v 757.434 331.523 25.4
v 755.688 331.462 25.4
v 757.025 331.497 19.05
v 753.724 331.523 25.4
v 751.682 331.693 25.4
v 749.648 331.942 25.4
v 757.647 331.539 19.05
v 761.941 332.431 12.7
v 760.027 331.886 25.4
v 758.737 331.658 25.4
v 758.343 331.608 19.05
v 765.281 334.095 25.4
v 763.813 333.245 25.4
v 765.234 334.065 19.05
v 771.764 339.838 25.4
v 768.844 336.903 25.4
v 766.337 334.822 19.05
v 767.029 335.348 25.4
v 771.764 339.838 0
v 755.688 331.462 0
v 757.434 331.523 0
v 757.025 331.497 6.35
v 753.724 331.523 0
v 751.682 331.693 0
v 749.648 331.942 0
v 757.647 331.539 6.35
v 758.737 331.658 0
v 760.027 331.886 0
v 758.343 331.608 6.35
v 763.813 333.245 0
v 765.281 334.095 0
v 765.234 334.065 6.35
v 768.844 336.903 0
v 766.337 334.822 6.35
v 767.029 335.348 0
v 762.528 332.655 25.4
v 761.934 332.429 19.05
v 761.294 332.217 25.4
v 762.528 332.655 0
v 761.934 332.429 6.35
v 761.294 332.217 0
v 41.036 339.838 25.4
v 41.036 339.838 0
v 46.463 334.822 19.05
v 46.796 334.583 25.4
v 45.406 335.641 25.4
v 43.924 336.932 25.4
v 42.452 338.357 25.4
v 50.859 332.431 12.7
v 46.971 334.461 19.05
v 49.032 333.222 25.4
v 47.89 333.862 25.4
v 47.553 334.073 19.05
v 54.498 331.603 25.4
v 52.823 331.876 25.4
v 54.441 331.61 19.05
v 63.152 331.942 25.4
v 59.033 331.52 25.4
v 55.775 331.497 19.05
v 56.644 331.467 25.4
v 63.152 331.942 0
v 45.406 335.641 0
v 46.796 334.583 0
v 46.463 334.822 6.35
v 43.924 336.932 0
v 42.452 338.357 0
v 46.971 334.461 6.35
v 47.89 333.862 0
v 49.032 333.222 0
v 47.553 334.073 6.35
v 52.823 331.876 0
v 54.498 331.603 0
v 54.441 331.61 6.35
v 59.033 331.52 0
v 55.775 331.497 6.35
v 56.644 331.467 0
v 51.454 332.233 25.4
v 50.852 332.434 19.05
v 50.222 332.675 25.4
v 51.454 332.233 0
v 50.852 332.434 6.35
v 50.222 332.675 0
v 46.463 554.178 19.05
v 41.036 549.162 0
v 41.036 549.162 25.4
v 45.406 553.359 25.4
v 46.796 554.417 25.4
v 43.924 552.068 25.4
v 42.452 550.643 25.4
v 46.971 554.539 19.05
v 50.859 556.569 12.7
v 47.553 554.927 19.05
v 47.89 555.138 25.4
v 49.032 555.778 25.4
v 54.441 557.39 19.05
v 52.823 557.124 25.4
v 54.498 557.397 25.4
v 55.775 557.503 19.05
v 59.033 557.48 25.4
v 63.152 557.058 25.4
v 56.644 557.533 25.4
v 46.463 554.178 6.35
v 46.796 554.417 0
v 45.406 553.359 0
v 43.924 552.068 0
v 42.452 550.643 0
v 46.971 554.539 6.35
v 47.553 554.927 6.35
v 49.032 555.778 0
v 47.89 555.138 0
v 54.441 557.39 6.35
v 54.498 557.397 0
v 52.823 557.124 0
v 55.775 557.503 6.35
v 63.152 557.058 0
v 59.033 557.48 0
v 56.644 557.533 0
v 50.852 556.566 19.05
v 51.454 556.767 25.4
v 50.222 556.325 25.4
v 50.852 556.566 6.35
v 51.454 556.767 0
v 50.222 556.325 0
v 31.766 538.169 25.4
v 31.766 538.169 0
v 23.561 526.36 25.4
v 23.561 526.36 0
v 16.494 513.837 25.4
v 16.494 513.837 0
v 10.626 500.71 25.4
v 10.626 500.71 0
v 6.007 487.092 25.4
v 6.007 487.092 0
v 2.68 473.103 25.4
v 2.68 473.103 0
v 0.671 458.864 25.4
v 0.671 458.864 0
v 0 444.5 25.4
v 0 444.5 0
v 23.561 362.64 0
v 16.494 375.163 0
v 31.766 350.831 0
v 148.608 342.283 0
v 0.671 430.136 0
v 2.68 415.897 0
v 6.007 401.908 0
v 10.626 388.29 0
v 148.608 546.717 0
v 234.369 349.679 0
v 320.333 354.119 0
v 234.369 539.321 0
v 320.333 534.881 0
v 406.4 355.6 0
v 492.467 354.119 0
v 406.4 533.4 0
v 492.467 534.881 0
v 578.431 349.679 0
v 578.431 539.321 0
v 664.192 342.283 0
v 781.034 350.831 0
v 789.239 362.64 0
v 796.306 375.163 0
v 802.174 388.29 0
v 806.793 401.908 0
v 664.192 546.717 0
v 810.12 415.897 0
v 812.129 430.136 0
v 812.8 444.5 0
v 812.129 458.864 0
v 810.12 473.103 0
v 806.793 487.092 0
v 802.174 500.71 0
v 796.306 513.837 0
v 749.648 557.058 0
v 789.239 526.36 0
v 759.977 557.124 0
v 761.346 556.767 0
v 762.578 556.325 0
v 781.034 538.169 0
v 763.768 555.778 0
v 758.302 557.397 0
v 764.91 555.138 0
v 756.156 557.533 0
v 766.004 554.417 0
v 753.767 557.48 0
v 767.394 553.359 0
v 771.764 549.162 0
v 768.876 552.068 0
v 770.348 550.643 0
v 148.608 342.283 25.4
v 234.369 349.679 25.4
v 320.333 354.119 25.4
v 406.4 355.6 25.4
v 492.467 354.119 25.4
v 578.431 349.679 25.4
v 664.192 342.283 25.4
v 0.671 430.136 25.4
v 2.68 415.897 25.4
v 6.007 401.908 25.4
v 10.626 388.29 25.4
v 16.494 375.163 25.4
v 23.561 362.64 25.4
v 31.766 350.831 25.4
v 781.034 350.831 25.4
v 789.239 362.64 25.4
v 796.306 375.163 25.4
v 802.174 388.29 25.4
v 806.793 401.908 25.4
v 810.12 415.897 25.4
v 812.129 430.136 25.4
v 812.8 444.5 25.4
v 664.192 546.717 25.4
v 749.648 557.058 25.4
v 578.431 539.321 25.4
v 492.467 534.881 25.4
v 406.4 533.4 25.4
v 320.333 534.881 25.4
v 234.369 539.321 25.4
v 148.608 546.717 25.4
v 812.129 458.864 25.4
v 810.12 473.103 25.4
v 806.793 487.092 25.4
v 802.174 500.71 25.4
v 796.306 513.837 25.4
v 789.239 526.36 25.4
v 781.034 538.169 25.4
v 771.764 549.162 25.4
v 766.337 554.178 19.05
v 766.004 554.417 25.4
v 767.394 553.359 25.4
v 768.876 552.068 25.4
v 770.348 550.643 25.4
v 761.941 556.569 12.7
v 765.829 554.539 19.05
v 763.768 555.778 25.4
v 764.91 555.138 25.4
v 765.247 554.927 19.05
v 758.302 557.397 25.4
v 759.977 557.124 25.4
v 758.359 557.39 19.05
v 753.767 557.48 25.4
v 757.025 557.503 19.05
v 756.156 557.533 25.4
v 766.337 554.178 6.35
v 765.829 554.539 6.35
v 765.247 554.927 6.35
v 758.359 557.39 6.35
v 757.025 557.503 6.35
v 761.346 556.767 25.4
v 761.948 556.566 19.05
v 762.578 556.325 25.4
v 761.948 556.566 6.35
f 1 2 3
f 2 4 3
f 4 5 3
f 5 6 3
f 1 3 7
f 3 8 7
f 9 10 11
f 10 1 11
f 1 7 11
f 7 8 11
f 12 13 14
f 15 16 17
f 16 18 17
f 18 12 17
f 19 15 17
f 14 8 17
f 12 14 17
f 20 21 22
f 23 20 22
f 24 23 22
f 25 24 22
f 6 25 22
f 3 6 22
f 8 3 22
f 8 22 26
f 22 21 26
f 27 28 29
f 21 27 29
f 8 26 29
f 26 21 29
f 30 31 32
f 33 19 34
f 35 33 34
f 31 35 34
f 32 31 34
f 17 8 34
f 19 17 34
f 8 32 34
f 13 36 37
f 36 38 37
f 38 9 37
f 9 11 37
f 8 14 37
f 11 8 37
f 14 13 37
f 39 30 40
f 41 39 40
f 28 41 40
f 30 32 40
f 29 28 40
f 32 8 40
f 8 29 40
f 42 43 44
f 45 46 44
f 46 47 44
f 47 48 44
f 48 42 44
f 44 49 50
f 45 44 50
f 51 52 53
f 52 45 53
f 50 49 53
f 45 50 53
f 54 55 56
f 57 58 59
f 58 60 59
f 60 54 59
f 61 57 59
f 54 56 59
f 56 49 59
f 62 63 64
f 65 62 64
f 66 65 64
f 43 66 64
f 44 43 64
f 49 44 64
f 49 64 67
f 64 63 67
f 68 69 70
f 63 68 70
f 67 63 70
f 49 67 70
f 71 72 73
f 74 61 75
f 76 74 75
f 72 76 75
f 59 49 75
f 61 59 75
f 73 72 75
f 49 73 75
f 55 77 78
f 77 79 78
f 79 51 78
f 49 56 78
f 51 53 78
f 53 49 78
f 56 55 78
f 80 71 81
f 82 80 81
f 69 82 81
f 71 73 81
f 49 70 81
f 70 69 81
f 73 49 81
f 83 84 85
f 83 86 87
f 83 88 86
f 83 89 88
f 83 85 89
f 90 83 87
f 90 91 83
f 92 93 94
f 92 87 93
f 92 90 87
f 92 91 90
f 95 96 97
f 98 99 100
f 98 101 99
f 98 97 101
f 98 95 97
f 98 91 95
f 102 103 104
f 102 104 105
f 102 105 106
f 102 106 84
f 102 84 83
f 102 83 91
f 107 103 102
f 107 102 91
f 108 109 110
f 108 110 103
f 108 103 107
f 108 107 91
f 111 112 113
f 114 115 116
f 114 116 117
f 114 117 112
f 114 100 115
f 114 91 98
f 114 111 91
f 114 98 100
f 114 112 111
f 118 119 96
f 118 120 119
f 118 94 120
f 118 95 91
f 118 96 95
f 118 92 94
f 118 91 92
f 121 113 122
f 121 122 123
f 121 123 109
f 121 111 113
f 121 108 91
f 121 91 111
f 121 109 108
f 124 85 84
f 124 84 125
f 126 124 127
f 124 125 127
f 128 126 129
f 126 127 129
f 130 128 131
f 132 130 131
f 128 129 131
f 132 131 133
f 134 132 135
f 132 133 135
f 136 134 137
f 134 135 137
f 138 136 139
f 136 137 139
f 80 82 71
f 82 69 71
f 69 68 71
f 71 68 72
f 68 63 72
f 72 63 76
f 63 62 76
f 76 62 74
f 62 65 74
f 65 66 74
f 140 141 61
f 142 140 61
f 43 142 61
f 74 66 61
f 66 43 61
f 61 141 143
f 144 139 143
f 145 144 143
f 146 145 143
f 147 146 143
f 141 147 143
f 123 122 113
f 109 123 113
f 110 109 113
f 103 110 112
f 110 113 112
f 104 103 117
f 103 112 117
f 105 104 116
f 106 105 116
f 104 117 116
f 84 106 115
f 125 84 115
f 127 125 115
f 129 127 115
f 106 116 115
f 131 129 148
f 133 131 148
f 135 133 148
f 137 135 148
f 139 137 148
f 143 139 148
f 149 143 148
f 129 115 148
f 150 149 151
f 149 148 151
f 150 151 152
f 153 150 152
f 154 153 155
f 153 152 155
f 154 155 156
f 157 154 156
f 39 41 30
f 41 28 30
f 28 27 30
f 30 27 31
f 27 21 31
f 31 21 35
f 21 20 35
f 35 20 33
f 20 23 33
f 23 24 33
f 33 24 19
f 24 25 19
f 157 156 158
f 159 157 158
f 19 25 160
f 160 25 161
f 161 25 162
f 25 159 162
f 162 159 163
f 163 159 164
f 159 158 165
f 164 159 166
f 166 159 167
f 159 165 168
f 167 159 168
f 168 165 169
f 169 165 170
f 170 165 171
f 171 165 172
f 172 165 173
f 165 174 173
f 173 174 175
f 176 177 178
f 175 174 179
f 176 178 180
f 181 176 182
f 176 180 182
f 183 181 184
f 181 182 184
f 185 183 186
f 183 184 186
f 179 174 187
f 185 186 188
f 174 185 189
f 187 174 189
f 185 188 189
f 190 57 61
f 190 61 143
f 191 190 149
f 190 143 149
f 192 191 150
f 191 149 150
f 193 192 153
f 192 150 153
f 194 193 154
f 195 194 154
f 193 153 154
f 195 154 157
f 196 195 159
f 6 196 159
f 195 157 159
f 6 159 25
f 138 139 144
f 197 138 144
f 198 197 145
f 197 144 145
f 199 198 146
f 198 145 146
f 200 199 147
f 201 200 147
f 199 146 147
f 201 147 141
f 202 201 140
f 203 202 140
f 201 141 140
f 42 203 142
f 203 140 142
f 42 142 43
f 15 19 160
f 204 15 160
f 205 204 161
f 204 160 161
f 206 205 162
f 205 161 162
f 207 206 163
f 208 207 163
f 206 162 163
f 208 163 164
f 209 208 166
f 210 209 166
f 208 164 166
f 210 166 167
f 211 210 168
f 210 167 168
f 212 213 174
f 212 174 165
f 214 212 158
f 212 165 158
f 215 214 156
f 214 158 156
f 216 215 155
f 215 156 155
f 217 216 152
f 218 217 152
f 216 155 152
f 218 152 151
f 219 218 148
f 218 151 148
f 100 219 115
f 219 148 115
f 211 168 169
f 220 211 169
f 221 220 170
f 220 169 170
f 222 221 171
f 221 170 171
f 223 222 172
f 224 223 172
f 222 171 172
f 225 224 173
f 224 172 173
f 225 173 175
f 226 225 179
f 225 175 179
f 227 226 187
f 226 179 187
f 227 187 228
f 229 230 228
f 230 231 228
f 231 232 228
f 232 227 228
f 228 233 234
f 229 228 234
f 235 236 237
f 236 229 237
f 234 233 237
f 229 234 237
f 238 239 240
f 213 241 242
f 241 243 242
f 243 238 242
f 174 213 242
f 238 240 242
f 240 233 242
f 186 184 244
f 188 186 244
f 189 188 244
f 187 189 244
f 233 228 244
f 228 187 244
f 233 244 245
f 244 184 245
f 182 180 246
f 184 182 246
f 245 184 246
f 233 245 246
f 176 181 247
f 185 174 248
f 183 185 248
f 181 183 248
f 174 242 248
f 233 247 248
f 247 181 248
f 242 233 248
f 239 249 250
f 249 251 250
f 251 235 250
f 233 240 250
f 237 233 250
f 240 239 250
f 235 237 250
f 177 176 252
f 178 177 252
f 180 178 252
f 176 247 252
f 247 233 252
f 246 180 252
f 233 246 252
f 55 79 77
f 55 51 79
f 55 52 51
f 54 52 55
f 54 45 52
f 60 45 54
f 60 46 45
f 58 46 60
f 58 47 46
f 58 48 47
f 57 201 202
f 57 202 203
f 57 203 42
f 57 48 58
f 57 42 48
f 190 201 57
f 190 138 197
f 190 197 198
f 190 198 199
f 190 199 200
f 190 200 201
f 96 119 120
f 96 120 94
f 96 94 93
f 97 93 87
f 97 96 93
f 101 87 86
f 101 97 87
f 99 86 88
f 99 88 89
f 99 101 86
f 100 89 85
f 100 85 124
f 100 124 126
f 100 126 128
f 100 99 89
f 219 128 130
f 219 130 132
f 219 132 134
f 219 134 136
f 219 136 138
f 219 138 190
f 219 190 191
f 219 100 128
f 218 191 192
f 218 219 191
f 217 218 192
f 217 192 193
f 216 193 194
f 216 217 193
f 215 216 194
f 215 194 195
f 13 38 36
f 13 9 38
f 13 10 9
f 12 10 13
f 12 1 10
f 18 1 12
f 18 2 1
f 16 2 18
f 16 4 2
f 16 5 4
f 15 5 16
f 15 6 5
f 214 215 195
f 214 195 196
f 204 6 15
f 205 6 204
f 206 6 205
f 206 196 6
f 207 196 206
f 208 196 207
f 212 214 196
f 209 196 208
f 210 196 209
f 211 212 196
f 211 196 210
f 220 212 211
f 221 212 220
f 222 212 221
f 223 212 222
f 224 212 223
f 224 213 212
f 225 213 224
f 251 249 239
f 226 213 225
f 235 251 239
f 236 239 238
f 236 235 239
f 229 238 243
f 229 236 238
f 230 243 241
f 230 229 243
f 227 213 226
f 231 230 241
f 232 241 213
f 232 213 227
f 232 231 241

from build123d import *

# Parameters (mm, degrees)
F1_DEPTH    = 25.4
F2_T1_DEPTH = 93.9988541888


# Not quite as in the source:
# - a fillet or chamfer that OpenCascade refuses, or shapes differently, is made with other operations: its cross-section is extruded or revolved along the edge and cut away or added


with BuildPart() as f1:
    # F0 (on Top) → F1 (new body)
    with BuildSketch(Plane.XY):
        with BuildLine():
            ThreePointArc((50.8, 558.8), (13.2719441568, 507.0402470414), (0, 444.5))
            ThreePointArc((0, 444.5), (13.2719441568, 381.9597529586), (50.8, 330.2))
            Line((50.8, 330.2), (50.8, 558.8))
        make_face()
        with BuildLine():
            ThreePointArc((277.2968022896, 536.7332159534), (163.7973759268, 545.1900472484), (50.8, 558.8))
            Line((50.8, 558.8), (50.8, 330.2))
            ThreePointArc((50.8, 330.2), (163.7973759268, 343.8099527516), (277.2968022896, 352.2667840466))
            ThreePointArc((277.2968022896, 352.2667840466), (300.1043048901, 395.8992851393), (307.975, 444.5))
            ThreePointArc((307.975, 444.5), (300.1043048901, 493.1007148607), (277.2968022896, 536.7332159534))
        make_face()
        with BuildLine():
            Line((762, 330.2), (762, 558.8))
            ThreePointArc((762, 558.8), (649.0026240732, 545.1900472484), (535.5031977104, 536.7332159534))
            ThreePointArc((535.5031977104, 536.7332159534), (504.825, 444.5), (535.5031977104, 352.2667840466))
            ThreePointArc((535.5031977104, 352.2667840466), (649.0026240732, 343.8099527516), (762, 330.2))
        make_face()
        with BuildLine():
            ThreePointArc((812.8, 444.5), (799.5280558432, 507.0402470414), (762, 558.8))
            Line((762, 558.8), (762, 330.2))
            ThreePointArc((762, 330.2), (799.5280558432, 381.9597529586), (812.8, 444.5))
        make_face()
        with BuildLine():
            ThreePointArc((535.5031977104, 536.7332159534), (406.4, 533.4), (277.2968022896, 536.7332159534))
            ThreePointArc((277.2968022896, 536.7332159534), (300.1043048901, 493.1007148607), (307.975, 444.5))
            ThreePointArc((307.975, 444.5), (300.1043048901, 395.8992851393), (277.2968022896, 352.2667840466))
            ThreePointArc((277.2968022896, 352.2667840466), (406.4, 355.6), (535.5031977104, 352.2667840466))
            ThreePointArc((535.5031977104, 352.2667840466), (504.825, 444.5), (535.5031977104, 536.7332159534))
        make_face()
    extrude(amount=F1_DEPTH)

    # F2: fillet of radius 25.4 on 4 edges, made by hand

    # F2_s2 → F2_t1 (cut)
    with BuildSketch(Plane.XY.offset(-34.2994270944)):
        with BuildLine():
            add(Edge.make_bspline(
                [(771.7640751065, 549.1617974106), (762.7642490879, 558.8744580913), (749.6481348223, 557.0578149138)],
                knots=[0, 0, 0, 1, 1, 1], degree=2, weights=[1, 1.5, 1]))
            ThreePointArc((749.6481348223, 557.0578149138), (755.8251531993, 557.9212093603), (762, 558.8))
            ThreePointArc((762, 558.8), (766.9894323112, 554.0896960119), (771.7640751065, 549.1617974106))
        make_face()
        with BuildLine():
            add(Edge.make_bspline(
                [(41.0359248935, 549.1617974105), (50.0357509121, 558.8744580913), (63.1518651777, 557.0578149137)],
                knots=[0, 0, 0, 1, 1, 1], degree=2, weights=[1, 1.5, 1]))
            ThreePointArc((63.1518651777, 557.0578149137), (56.9748468007, 557.9212093602), (50.8, 558.8))
            ThreePointArc((50.8, 558.8), (45.8105676888, 554.0896960119), (41.0359248935, 549.1617974105))
        make_face()
        with BuildLine():
            add(Edge.make_bspline(
                [(41.0359248935, 339.8382025894), (50.0357509121, 330.1255419087), (63.1518651777, 331.9421850862)],
                knots=[0, 0, 0, 1, 1, 1], degree=2, weights=[1, 1.5, 1]))
            ThreePointArc((63.1518651777, 331.9421850862), (56.9748468007, 331.0787906397), (50.8, 330.2))
            ThreePointArc((50.8, 330.2), (45.8105676888, 334.9103039881), (41.0359248935, 339.8382025894))
        make_face()
        with BuildLine():
            add(Edge.make_bspline(
                [(749.6481348223, 331.9421850862), (762.7642490879, 330.1255419087), (771.7640751065, 339.8382025894)],
                knots=[0, 0, 0, 1, 1, 1], degree=2, weights=[1, 1.5, 1]))
            ThreePointArc((771.7640751065, 339.8382025894), (766.9894323112, 334.9103039881), (762, 330.2))
            ThreePointArc((762, 330.2), (755.8251531993, 331.0787906397), (749.6481348223, 331.9421850862))
        make_face()
    extrude(amount=F2_T1_DEPTH, mode=Mode.SUBTRACT)


solid = f1.part
